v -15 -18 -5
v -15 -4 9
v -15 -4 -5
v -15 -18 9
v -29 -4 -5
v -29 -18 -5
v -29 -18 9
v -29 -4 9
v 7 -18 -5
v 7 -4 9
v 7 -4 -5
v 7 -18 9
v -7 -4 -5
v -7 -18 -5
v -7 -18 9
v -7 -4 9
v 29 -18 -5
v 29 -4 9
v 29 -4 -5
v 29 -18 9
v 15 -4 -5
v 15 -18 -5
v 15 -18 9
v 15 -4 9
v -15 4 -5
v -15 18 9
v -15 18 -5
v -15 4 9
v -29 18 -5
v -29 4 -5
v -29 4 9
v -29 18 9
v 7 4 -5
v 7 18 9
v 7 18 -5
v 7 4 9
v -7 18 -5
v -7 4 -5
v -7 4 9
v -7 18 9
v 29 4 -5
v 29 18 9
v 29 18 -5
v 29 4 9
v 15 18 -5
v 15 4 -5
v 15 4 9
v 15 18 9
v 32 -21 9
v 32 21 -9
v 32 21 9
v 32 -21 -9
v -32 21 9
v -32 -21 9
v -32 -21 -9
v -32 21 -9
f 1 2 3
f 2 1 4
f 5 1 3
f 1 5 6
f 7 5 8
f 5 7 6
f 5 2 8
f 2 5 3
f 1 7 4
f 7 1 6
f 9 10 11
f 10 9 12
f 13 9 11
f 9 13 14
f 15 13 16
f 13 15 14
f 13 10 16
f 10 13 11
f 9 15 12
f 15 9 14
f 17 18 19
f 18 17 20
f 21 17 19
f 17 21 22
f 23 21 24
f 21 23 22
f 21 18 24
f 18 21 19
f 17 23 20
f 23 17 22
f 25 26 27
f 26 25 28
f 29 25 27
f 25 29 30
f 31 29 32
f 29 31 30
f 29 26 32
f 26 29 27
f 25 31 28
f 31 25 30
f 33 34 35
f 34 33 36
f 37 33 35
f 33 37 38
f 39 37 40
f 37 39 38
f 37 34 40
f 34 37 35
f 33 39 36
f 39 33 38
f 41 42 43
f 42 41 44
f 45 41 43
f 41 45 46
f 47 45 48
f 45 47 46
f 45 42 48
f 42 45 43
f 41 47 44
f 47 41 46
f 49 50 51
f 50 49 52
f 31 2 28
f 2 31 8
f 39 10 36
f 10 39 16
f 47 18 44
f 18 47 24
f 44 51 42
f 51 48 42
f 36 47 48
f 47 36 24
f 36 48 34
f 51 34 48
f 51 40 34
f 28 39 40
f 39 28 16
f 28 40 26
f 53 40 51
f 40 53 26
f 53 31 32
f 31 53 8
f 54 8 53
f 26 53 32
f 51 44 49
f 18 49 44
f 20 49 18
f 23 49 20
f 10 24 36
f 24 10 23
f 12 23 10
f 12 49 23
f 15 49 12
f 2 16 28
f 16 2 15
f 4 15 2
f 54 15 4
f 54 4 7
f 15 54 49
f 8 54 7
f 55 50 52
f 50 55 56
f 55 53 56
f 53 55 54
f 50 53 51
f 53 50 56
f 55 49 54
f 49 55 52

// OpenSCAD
$fn = 32;

// ----------------------------------------------------------------------
// Pocket plate 64 x 42 x 18
// 2 x 3 pockets 14 mm square, 14 mm deep
// ----------------------------------------------------------------------

// --- parameters (mm) ---
thickness = 18;  // plate thickness
floor_t = 4;     // material left under each pocket
pocket = 14;     // pocket side length
pitch_x = 22;    // pocket pitch along X
pitch_y = 22;    // pocket pitch along Y
cols = 3;        // pockets per row
rows = 2;        // rows of pockets

// --- derived feature positions (mm) ---
depth = thickness - floor_t;        // = 14   pocket depth, down to the floor
span_x = (cols - 1) * pitch_x;      // = 44   distance between outer pockets
span_y = (rows - 1) * pitch_y;      // = 22   distance between outer pocket rows
origin_x = -span_x / 2;             // = -22   X of the first pocket
origin_y = -span_y / 2;             // = -11   Y of the first pocket
plate = [span_x + pocket + 6, span_y + pocket + 6, thickness];  // = [64, 42, 18]   overall size: pockets plus 3 mm of wall on each side
feature_centers = [
  [origin_x + 0 * pitch_x, origin_y + 0 * pitch_y],
  [origin_x + 1 * pitch_x, origin_y + 0 * pitch_y],
  [origin_x + 2 * pitch_x, origin_y + 0 * pitch_y],
  [origin_x + 0 * pitch_x, origin_y + 1 * pitch_y],
  [origin_x + 1 * pitch_x, origin_y + 1 * pitch_y],
  [origin_x + 2 * pitch_x, origin_y + 1 * pitch_y]
];   // pocket centres, used verbatim by the cutter loop

// plate outline, then one pocket per centre in feature_centers
difference() {
  cube(plate, center = true);
  for (centre = feature_centers)
    translate([centre[0] - pocket / 2, centre[1] - pocket / 2, plate[2] / 2 - depth])
      cube([pocket, pocket, depth + 1]);  // centred on the declared pocket centre
}
